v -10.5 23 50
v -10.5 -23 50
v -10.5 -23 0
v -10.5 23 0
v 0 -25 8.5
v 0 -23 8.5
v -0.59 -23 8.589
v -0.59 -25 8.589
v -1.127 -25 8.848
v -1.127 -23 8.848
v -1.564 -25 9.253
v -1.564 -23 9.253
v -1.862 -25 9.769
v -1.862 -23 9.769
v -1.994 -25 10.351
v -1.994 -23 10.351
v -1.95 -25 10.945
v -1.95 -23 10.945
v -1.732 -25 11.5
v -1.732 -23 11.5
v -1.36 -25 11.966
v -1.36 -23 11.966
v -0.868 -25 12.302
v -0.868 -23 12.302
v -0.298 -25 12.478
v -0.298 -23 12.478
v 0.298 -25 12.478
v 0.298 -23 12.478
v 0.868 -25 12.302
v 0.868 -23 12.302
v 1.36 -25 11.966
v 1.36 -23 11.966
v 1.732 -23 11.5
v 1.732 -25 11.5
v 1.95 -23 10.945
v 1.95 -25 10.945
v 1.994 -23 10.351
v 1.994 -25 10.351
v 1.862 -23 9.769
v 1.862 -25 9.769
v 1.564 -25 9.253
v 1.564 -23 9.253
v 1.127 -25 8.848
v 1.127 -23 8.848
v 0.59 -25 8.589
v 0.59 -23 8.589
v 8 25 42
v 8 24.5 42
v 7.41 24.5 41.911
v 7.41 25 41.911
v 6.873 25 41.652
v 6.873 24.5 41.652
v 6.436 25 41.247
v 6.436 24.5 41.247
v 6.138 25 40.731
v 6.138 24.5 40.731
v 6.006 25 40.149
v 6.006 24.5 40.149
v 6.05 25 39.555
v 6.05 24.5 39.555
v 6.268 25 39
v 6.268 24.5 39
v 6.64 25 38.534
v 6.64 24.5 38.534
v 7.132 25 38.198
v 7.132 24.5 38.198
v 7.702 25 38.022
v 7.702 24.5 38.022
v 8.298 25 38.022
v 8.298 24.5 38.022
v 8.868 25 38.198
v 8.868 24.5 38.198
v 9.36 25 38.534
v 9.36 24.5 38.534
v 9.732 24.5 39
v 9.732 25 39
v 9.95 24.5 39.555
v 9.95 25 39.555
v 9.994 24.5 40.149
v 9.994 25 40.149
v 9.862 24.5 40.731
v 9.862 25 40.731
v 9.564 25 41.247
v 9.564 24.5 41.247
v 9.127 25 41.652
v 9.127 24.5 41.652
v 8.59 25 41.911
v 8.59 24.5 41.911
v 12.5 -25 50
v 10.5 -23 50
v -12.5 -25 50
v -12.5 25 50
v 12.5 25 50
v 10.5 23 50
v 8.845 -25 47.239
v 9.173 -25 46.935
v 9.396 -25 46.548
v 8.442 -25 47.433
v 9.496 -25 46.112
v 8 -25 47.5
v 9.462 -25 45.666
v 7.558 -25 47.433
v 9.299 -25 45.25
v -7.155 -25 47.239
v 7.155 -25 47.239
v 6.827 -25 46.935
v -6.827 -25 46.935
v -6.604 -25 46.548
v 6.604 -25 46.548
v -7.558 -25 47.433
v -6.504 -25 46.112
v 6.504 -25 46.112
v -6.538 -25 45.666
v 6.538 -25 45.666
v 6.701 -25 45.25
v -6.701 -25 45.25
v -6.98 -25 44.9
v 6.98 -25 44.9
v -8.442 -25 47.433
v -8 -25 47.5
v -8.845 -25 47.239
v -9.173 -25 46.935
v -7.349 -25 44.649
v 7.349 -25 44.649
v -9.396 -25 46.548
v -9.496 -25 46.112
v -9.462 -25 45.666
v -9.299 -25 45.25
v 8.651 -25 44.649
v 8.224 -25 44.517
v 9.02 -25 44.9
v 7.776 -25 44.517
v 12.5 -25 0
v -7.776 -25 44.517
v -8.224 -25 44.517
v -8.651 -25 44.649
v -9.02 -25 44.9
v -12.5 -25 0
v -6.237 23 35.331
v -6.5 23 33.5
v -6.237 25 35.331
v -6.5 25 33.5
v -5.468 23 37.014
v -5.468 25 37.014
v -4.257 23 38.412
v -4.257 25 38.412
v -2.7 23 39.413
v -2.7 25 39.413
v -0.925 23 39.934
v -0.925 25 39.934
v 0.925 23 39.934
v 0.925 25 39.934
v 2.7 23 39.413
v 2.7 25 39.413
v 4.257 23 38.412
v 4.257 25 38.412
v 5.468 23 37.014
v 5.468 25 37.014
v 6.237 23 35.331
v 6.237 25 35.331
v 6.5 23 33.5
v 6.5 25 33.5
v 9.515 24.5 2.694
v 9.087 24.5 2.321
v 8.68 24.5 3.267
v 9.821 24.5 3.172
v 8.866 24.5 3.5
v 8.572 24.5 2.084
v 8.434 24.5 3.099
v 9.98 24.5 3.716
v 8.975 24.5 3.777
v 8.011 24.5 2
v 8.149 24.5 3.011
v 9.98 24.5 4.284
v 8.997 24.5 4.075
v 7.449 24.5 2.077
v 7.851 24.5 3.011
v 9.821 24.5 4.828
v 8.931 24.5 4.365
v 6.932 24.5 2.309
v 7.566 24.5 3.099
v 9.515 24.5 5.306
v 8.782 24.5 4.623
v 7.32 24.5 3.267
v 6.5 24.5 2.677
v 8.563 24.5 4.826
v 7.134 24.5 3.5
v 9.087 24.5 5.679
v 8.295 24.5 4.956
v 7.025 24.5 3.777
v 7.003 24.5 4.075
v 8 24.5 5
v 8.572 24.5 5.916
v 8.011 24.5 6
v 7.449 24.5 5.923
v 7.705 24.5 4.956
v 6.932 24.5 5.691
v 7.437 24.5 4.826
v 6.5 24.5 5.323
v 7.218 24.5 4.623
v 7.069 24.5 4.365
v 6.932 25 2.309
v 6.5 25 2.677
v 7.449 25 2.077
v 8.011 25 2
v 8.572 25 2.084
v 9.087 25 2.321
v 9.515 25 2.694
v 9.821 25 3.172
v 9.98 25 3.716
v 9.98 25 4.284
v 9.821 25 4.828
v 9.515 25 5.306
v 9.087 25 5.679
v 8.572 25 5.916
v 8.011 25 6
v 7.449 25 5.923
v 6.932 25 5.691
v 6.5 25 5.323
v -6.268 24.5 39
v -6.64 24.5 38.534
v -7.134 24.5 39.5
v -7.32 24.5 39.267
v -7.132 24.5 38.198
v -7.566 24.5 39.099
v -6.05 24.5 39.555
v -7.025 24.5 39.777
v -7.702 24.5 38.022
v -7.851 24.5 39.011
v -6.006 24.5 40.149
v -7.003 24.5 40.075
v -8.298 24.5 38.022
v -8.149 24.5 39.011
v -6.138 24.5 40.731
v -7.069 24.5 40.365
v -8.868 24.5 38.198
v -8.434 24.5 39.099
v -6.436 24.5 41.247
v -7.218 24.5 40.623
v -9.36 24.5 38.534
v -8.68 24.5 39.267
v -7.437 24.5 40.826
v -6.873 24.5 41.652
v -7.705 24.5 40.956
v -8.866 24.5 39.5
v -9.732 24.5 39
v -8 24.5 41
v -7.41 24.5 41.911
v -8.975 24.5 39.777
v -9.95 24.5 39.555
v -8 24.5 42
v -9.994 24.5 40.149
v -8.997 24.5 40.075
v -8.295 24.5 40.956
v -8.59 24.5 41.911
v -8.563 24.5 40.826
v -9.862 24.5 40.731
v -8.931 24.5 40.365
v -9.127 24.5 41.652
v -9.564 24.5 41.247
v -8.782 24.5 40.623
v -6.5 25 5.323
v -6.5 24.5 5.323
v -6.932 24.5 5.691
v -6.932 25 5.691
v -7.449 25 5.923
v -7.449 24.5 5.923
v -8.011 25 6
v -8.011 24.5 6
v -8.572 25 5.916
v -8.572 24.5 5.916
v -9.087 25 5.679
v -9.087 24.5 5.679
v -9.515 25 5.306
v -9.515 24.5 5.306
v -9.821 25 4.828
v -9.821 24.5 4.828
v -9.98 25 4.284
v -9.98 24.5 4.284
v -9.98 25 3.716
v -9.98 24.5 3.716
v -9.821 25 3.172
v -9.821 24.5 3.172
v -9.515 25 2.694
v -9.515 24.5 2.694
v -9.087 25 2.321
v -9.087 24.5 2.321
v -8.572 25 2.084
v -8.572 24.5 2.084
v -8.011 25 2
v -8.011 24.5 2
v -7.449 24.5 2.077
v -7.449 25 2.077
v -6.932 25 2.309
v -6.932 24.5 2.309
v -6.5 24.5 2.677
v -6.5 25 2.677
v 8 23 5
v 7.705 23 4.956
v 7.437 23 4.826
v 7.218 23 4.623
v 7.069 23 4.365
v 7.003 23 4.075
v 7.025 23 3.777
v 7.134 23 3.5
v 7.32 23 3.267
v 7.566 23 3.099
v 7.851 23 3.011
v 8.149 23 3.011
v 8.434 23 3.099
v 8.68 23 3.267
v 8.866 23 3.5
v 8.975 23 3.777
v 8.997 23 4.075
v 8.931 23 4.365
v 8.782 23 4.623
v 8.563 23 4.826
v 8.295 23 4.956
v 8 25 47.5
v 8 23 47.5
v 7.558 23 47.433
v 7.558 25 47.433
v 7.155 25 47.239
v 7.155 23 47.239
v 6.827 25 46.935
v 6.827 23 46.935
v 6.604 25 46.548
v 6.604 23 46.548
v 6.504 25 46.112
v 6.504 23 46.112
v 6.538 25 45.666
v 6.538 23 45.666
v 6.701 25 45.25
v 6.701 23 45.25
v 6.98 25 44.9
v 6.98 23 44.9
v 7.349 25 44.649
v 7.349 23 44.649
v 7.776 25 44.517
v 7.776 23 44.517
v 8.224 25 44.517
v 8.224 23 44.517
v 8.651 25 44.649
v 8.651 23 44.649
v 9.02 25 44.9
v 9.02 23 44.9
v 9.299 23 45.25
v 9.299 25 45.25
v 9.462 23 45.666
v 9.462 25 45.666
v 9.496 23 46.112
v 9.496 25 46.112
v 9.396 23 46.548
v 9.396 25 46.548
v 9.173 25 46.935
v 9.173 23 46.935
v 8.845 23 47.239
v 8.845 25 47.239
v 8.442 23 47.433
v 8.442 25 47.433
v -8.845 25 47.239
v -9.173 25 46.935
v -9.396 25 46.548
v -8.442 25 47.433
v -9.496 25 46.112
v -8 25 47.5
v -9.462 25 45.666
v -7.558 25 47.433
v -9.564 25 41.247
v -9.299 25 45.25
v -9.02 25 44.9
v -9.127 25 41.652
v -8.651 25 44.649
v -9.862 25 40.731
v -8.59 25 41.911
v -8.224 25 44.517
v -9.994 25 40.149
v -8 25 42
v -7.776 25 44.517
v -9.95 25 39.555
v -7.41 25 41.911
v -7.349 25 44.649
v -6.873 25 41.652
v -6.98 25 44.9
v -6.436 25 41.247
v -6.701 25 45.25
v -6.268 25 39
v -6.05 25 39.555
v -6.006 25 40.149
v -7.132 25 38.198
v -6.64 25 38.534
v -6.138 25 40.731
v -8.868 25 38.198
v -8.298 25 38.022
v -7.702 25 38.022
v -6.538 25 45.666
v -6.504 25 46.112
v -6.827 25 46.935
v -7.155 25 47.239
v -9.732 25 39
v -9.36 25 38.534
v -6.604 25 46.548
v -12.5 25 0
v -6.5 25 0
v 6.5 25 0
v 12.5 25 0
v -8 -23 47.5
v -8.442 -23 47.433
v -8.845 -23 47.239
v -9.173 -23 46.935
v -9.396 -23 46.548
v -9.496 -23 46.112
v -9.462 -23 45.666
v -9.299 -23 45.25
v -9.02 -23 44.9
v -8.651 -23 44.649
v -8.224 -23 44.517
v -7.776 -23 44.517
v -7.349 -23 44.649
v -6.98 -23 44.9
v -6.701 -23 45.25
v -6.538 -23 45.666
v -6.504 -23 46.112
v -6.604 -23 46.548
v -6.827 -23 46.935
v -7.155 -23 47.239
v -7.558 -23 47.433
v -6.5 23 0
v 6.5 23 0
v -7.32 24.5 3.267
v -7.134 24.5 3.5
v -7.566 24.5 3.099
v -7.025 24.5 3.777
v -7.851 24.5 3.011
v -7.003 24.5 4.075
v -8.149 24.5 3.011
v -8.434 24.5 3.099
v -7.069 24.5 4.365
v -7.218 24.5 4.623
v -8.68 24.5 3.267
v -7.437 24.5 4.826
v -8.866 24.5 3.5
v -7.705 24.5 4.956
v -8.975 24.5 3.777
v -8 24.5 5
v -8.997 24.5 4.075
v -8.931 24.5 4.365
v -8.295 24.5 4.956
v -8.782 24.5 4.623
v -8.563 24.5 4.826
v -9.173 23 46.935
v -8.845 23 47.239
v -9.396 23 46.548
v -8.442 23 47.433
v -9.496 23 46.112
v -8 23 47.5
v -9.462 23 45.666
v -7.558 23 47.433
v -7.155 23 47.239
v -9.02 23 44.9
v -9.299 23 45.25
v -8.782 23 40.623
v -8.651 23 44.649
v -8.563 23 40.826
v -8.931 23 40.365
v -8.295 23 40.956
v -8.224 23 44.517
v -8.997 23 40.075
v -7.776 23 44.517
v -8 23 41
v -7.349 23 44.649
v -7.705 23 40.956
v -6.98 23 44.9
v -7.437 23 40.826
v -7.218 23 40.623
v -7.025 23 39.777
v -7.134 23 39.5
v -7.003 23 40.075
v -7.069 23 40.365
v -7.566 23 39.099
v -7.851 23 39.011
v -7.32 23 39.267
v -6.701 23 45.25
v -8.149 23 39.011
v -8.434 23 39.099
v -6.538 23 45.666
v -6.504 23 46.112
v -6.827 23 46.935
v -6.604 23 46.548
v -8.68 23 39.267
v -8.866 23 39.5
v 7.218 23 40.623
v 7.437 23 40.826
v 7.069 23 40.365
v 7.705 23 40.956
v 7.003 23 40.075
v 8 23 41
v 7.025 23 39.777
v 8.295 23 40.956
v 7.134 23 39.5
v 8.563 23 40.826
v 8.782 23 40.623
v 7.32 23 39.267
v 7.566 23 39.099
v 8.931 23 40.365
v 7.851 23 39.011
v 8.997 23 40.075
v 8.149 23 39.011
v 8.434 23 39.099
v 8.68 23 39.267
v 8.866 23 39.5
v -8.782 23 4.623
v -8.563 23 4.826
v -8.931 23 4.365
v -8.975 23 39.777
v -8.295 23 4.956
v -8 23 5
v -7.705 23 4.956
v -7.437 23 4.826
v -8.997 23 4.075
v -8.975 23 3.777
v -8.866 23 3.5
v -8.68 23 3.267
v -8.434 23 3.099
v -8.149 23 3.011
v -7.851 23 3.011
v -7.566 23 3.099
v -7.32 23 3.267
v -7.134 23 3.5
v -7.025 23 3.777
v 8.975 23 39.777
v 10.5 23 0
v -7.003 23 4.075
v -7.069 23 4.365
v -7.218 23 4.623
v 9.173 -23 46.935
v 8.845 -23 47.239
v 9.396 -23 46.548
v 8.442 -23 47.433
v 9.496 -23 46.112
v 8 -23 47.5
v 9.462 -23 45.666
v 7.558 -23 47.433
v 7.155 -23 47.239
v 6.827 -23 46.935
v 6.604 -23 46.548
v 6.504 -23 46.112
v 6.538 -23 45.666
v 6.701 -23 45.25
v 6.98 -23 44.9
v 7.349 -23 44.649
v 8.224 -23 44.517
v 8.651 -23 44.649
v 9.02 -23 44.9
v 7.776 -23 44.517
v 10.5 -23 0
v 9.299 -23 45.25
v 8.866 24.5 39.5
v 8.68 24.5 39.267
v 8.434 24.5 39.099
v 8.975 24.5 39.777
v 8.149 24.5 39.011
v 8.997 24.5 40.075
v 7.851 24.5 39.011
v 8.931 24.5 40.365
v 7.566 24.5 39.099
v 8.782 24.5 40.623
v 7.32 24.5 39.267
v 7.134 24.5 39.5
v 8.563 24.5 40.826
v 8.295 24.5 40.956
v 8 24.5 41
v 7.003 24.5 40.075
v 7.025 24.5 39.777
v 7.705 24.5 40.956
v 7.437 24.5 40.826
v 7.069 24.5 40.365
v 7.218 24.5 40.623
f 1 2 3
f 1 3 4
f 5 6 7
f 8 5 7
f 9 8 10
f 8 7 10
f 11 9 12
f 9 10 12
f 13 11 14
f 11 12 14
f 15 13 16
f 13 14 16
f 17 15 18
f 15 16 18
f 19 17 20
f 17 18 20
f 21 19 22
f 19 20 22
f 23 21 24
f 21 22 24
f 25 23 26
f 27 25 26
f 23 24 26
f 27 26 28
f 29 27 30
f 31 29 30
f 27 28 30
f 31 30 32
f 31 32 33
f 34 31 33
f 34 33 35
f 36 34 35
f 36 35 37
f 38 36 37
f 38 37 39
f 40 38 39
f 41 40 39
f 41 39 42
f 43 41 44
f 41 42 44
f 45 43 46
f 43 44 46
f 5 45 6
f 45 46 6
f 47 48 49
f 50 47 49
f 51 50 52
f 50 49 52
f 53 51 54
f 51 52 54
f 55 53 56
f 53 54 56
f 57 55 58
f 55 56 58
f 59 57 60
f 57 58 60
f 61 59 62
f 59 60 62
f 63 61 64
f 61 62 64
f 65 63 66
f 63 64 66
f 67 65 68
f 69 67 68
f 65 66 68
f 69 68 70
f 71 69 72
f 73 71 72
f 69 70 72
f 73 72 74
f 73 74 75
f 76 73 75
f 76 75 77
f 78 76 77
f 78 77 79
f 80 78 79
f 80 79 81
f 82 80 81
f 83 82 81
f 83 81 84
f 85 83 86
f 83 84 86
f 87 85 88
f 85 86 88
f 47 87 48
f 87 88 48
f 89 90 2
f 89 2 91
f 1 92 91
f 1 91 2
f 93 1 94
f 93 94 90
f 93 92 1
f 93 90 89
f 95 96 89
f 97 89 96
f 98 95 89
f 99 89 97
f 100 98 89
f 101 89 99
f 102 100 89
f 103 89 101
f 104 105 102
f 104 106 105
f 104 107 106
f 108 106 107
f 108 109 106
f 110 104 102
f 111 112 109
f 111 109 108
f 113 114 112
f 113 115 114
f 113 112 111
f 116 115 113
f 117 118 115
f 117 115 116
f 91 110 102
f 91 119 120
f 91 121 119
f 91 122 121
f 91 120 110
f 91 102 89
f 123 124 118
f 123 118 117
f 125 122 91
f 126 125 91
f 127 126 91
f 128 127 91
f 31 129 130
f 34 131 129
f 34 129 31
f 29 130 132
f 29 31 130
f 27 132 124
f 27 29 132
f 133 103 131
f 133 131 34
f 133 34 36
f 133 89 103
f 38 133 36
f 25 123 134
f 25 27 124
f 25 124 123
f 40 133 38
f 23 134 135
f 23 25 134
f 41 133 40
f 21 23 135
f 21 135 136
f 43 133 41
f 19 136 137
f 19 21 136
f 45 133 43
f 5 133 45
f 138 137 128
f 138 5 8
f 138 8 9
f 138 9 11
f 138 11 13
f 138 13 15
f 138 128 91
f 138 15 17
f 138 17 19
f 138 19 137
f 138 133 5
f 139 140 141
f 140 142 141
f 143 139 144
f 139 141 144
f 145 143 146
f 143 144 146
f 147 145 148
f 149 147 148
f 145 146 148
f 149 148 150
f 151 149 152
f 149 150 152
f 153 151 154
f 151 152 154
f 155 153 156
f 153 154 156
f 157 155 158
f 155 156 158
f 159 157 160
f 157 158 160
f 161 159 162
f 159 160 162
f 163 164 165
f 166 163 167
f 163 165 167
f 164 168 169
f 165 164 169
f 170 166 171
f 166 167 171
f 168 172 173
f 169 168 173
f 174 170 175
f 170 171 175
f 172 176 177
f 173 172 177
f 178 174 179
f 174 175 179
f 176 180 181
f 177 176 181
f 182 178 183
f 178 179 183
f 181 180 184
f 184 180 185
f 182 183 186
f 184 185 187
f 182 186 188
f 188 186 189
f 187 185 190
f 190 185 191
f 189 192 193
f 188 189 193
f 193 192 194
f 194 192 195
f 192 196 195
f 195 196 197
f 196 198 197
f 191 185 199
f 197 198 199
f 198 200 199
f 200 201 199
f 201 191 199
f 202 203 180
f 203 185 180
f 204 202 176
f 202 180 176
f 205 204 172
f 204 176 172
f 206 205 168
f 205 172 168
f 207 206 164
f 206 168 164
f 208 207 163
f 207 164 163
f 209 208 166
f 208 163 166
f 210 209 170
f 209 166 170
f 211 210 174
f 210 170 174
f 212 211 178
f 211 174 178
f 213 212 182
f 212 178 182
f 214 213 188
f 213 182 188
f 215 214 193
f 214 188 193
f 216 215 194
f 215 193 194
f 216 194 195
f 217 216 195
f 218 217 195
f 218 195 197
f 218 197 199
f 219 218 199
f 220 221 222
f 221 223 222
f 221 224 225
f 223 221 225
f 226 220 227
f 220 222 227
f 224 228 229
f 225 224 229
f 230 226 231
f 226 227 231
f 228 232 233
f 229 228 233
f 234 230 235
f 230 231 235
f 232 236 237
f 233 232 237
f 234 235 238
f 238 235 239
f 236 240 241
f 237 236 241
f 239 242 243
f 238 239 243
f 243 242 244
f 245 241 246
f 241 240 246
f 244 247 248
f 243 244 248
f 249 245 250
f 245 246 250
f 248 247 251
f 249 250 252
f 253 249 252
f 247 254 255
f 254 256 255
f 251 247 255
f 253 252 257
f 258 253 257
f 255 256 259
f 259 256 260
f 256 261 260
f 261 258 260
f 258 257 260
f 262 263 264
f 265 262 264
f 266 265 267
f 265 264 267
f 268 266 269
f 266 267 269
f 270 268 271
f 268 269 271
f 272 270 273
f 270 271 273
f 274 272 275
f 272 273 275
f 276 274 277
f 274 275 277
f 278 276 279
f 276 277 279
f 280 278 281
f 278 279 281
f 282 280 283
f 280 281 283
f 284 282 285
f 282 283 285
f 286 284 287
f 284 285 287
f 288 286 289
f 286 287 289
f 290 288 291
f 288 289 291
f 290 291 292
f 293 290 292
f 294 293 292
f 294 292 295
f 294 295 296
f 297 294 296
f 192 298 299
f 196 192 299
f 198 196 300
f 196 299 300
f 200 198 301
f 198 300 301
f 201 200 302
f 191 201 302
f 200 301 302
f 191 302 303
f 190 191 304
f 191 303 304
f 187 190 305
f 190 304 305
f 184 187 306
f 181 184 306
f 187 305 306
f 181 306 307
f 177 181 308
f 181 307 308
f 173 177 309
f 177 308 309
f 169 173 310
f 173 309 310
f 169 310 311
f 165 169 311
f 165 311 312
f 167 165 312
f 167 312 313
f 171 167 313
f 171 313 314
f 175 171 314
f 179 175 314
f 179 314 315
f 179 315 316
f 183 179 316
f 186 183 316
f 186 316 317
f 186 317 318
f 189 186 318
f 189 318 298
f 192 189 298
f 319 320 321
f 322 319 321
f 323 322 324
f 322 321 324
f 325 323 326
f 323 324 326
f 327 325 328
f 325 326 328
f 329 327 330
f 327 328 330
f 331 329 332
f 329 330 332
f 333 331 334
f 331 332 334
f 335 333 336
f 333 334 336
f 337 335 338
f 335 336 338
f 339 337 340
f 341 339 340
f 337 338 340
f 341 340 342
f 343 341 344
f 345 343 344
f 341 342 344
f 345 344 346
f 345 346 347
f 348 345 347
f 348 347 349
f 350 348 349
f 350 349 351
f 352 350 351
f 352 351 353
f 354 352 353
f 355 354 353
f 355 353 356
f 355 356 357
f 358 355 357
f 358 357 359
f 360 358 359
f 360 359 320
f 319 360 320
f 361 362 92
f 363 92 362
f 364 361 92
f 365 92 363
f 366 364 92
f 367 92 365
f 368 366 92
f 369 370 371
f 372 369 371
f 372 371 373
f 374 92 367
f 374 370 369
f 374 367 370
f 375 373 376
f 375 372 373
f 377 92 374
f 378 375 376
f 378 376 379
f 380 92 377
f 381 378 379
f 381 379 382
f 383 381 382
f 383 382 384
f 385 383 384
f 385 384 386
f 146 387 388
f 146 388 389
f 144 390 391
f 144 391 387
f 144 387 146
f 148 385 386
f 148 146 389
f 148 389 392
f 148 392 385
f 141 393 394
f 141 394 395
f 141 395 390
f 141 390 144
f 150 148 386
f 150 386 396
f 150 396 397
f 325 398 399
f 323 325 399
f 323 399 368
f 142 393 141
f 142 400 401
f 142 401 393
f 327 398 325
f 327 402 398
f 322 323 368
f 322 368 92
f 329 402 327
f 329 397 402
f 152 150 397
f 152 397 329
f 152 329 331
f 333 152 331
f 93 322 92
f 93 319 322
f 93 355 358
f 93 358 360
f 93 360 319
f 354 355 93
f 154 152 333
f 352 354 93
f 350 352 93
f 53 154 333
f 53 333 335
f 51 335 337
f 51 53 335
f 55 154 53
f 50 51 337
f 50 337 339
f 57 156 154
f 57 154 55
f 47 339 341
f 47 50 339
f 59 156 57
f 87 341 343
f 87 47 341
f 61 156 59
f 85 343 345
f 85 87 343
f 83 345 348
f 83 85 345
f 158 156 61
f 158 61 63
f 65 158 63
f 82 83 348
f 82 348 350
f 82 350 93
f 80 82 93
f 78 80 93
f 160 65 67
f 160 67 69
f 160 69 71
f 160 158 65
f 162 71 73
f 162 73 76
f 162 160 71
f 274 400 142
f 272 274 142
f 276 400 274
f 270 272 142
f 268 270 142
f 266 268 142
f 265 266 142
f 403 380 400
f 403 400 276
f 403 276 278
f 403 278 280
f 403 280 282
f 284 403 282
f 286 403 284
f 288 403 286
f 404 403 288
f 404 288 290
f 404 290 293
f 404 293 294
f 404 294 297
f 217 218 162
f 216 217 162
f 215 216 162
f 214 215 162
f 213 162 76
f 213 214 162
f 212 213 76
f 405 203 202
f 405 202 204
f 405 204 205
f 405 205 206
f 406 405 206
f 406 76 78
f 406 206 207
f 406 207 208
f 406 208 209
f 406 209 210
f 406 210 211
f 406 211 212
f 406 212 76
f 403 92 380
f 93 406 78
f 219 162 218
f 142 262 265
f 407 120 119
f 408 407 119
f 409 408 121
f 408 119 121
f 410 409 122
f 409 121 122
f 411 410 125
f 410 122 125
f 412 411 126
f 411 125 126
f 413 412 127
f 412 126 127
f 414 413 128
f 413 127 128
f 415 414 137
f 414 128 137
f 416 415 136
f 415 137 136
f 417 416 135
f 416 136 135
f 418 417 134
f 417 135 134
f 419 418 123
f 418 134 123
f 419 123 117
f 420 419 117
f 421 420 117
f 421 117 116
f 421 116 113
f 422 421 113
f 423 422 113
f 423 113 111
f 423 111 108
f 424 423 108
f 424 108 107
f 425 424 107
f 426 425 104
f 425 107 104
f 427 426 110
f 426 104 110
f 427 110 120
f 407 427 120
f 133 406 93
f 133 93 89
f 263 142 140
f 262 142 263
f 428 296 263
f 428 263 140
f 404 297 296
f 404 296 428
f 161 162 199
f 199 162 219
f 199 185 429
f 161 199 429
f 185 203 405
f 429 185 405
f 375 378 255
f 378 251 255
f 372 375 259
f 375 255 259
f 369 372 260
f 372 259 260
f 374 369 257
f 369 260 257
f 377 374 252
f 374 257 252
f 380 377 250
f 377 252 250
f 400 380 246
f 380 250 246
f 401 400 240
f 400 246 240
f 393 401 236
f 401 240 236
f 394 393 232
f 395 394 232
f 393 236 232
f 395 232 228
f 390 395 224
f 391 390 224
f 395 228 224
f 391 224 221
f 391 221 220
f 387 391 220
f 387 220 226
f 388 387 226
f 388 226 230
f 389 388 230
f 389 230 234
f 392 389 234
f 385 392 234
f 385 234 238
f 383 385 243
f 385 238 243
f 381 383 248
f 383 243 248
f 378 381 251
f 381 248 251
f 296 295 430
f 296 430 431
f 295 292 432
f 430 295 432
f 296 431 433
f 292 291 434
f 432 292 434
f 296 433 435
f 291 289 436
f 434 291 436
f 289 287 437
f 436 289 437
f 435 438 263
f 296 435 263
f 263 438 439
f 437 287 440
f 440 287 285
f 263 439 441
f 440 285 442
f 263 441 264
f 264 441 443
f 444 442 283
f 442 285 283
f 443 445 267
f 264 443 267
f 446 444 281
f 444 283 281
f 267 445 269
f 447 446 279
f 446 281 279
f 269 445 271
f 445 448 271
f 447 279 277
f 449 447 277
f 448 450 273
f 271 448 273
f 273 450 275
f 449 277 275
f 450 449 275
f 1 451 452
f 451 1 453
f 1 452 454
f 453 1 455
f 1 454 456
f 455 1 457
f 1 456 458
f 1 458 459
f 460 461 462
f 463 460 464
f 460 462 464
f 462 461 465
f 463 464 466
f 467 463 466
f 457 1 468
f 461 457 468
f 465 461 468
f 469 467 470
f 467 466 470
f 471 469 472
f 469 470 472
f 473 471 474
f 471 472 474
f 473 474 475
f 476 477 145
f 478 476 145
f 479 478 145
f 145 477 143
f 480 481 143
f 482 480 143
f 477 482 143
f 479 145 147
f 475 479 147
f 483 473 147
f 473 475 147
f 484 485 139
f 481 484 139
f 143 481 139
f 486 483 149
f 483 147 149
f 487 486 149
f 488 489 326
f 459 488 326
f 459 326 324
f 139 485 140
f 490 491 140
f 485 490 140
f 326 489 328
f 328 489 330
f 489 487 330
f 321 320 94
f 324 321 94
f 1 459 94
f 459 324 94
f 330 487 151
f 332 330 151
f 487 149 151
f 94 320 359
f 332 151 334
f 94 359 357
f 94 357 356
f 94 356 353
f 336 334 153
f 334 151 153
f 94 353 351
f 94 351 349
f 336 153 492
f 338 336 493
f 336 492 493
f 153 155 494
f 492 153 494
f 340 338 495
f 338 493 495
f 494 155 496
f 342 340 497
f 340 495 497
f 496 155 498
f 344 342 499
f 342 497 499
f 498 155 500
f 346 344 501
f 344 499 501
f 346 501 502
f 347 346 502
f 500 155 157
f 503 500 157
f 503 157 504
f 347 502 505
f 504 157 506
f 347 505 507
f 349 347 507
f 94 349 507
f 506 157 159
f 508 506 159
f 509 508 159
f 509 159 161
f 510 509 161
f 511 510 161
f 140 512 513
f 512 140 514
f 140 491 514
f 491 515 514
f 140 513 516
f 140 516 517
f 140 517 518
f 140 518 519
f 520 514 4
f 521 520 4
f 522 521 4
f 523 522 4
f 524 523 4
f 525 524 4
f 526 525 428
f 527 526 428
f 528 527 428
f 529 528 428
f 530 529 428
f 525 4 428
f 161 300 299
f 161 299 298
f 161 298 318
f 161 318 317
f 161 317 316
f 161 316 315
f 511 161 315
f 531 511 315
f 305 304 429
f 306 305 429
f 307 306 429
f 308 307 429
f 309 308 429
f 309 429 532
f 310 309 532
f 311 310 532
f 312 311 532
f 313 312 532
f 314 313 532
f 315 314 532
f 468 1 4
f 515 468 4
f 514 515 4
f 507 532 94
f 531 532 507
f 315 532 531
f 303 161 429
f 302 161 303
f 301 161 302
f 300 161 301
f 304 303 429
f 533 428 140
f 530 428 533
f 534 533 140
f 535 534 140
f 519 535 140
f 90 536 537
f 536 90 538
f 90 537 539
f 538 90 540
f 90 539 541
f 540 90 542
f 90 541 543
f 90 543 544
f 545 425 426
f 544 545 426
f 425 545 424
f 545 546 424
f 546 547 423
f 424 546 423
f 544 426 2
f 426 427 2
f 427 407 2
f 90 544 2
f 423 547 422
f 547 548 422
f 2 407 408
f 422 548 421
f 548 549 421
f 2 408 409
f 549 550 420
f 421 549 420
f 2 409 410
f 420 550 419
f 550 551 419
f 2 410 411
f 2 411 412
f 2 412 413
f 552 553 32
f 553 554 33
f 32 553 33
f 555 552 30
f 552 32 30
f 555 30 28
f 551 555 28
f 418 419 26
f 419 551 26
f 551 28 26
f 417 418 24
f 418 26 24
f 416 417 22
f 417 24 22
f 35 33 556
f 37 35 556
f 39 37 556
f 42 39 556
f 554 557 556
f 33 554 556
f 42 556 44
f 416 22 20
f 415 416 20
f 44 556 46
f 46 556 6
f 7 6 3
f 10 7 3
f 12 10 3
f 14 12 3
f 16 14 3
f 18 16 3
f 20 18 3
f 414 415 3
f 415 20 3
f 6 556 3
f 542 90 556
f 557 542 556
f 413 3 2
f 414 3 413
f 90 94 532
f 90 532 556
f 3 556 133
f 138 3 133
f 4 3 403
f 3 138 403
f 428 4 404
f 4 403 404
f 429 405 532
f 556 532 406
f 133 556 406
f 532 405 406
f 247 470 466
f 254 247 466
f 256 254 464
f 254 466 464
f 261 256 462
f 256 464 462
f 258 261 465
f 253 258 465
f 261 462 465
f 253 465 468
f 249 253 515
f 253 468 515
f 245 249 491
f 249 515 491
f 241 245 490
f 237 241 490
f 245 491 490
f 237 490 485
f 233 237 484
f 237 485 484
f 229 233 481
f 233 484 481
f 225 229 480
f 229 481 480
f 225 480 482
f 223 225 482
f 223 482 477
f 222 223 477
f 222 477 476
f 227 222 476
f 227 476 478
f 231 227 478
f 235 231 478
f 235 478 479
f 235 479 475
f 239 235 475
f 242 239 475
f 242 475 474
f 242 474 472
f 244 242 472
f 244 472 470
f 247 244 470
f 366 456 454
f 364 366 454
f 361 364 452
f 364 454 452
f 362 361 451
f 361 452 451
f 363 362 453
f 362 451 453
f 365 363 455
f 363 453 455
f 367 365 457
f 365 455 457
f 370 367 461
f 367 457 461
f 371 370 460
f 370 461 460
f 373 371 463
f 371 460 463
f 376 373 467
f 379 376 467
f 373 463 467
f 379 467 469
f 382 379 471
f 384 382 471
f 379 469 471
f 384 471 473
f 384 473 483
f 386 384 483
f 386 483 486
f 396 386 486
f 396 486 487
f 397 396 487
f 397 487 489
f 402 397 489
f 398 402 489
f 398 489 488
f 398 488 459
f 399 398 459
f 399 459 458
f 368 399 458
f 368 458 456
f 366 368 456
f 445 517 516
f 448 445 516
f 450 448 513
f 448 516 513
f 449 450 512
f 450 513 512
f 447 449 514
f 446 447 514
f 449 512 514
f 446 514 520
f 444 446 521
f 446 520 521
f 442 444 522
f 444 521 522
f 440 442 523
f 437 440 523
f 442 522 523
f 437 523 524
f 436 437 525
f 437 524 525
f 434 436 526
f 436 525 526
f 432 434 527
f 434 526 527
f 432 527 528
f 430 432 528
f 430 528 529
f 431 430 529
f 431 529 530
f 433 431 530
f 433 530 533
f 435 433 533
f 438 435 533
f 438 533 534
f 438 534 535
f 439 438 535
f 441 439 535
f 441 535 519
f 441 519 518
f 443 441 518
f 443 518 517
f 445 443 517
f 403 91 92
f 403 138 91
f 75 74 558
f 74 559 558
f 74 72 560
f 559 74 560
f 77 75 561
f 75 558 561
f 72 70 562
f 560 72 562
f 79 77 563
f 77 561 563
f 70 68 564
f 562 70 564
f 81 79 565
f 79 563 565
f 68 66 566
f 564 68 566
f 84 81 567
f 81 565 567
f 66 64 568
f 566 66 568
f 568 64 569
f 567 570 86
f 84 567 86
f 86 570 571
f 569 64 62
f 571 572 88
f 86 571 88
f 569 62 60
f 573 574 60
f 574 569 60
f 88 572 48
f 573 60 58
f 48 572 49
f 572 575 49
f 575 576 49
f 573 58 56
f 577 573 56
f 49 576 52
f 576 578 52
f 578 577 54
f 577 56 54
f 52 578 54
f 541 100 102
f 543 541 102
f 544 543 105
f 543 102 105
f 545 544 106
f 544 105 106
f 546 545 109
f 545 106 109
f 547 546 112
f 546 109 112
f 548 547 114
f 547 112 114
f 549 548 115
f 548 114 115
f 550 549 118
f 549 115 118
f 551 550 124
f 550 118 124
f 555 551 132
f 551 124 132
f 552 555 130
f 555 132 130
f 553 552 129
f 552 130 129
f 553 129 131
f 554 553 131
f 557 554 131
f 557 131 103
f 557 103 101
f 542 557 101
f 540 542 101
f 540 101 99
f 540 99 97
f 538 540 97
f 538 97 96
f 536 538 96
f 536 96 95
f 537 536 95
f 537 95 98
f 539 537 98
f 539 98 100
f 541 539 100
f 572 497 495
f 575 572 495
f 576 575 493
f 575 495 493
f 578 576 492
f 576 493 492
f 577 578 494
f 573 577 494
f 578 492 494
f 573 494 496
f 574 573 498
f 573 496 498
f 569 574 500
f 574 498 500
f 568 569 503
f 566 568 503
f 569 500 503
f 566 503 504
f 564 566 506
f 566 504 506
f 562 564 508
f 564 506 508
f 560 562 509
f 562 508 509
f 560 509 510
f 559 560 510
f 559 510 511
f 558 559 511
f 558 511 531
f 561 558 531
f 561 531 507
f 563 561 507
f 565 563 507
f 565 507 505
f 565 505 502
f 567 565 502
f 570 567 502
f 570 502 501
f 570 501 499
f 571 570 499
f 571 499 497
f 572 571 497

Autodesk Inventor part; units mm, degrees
ref_plane "YZ Plane" through (0, 0, 0) normal (1, 0, 0) x (0, 1, 0)
ref_plane "XZ Plane" through (0, 0, 0) normal (0, 1, 0) x (-1, 0, 0)
ref_plane "XY Plane" through (0, 0, 0) normal (0, 0, 1) x (1, 0, 0)
sketch "スケッチ1" plane through (0, 0, 0) normal (0, 0, 1) x (1, 0, 0)
  line L0 (-12.5, 25) -> (12.5, 25)
  line L1 (12.5, 25) -> (12.5, -25)
  line L2 (12.5, -25) -> (-12.5, -25)
  line L3 (-12.5, -25) -> (-12.5, 25)
  line L4 (-10.5, 23) -> (10.5, 23)
  line L5 (10.5, 23) -> (10.5, -23)
  line L6 (10.5, -23) -> (-10.5, -23)
  line L7 (-10.5, -23) -> (-10.5, 23)
  point P0 (0, 0)
  dimension "d0" = 25
  dimension "d1" = 50
  dimension "d2" = 46
  dimension "d3" = 21
  dimension "d4" = 25
  dimension "d5" = 23
  dimension "d6" = 10.5
  dimension "d7" = 12.5
extrude "押し出し1" add sketch "スケッチ1" along normal blind 50
sketch "スケッチ2" plane through (-12.5, 25, 0) normal (0, 1, 0) x (1, 0, 0)
  line L0 (0, 0) -> (25, 0) projected
  line L1 (0, 0) -> (0, -50) projected
  arc A0 (6, -33.5) -> (19, -33.5) centre (12.5, -33.5) ccw
  line L2 (6, -33.5) -> (6, 0)
  line L3 (19, -33.5) -> (19, 0)
  point P0 (12.5, 0)
  dimension "d10" = 13
  dimension "d11" = 33.5
  dimension "d12" = 12.5
extrude "押し出し2" cut sketch "スケッチ2" against normal blind 2
sketch "スケッチ3" plane through (-12.5, 25, 50) normal (0, 1, 0) x (1, 0, 0)
  arc A0 (6, 16.5) -> (19, 16.5) centre (12.5, 16.5) ccw projected
  circle A1 centre (4.5, 10) radius 1
  circle A2 centre (4.5, 46) radius 1
  circle A3 centre (20.5, 46) radius 1
  circle A4 centre (20.5, 10) radius 1
  point P0 (12.5, 50)
  dimension "d15" = 6.5
  dimension "d16" = 6.5
  dimension "d17" = 2
  dimension "d18" = 8
  dimension "d19" = 8
  dimension "d20" = 8
  dimension "d21" = 8
  dimension "d22" = 29.5
  dimension "d23" = 29.5
hole "穴1" at (-8, 25, 4) at (8, 25, 4) at (8, 25, 40) at (-8, 25, 40) direction (0, -1, 0) diameter 2 depth 2 tip angle 118 counterbore diameter 4 counterbore depth 0.5
sketch "スケッチ4" plane through (-12.5, -25, 0) normal (0, -1, 0) x (1, 0, 0)
  line L0 (25, 0) -> (0, 0) projected
  line L1 (25, 0) -> (25, 50) projected
  circle A0 centre (12.5, 10.5) radius 2
  point P0 (12.5, 0)
  dimension "d31" = 4
  dimension "d32" = 12.5
  dimension "d33" = 10.5
hole "穴2" at (0, -25, 10.5) direction (0, 1, 0) diameter 4 end through all
sketch "スケッチ5" plane through (-12.5, 25, 50) normal (0, 1, 0) x (1, 0, 0)
  line L0 (0, 0) -> (25, 0) projected
  arc A0 (6, 16.5) -> (19, 16.5) centre (12.5, 16.5) ccw projected
  circle A1 centre (20.5, 4) radius 1.5
  circle A2 centre (4.5, 4) radius 1.5
  point P0 (12.5, 50)
  dimension "d43" = 4
  dimension "d44" = 4
  dimension "d46" = 8
  dimension "d47" = 8
  dimension "d57" = 3
hole "穴4" at (-8, 25, 46) at (8, 25, 46) direction (0, -1, 0) diameter 3 end through all
thread "ねじ1" size "M3x0.5" class "6H" standard "ANSI Metric M Profile" full length
thread "ねじ2" size "M3x0.5" class "6H" standard "ANSI Metric M Profile" full length
thread "ねじ3" size "M3x0.5" class "6H" standard "ANSI Metric M Profile" full length
thread "ねじ4" size "M3x0.5" class "6H" standard "ANSI Metric M Profile" full length
properties part number "14" material "アルミニウム 6061"
